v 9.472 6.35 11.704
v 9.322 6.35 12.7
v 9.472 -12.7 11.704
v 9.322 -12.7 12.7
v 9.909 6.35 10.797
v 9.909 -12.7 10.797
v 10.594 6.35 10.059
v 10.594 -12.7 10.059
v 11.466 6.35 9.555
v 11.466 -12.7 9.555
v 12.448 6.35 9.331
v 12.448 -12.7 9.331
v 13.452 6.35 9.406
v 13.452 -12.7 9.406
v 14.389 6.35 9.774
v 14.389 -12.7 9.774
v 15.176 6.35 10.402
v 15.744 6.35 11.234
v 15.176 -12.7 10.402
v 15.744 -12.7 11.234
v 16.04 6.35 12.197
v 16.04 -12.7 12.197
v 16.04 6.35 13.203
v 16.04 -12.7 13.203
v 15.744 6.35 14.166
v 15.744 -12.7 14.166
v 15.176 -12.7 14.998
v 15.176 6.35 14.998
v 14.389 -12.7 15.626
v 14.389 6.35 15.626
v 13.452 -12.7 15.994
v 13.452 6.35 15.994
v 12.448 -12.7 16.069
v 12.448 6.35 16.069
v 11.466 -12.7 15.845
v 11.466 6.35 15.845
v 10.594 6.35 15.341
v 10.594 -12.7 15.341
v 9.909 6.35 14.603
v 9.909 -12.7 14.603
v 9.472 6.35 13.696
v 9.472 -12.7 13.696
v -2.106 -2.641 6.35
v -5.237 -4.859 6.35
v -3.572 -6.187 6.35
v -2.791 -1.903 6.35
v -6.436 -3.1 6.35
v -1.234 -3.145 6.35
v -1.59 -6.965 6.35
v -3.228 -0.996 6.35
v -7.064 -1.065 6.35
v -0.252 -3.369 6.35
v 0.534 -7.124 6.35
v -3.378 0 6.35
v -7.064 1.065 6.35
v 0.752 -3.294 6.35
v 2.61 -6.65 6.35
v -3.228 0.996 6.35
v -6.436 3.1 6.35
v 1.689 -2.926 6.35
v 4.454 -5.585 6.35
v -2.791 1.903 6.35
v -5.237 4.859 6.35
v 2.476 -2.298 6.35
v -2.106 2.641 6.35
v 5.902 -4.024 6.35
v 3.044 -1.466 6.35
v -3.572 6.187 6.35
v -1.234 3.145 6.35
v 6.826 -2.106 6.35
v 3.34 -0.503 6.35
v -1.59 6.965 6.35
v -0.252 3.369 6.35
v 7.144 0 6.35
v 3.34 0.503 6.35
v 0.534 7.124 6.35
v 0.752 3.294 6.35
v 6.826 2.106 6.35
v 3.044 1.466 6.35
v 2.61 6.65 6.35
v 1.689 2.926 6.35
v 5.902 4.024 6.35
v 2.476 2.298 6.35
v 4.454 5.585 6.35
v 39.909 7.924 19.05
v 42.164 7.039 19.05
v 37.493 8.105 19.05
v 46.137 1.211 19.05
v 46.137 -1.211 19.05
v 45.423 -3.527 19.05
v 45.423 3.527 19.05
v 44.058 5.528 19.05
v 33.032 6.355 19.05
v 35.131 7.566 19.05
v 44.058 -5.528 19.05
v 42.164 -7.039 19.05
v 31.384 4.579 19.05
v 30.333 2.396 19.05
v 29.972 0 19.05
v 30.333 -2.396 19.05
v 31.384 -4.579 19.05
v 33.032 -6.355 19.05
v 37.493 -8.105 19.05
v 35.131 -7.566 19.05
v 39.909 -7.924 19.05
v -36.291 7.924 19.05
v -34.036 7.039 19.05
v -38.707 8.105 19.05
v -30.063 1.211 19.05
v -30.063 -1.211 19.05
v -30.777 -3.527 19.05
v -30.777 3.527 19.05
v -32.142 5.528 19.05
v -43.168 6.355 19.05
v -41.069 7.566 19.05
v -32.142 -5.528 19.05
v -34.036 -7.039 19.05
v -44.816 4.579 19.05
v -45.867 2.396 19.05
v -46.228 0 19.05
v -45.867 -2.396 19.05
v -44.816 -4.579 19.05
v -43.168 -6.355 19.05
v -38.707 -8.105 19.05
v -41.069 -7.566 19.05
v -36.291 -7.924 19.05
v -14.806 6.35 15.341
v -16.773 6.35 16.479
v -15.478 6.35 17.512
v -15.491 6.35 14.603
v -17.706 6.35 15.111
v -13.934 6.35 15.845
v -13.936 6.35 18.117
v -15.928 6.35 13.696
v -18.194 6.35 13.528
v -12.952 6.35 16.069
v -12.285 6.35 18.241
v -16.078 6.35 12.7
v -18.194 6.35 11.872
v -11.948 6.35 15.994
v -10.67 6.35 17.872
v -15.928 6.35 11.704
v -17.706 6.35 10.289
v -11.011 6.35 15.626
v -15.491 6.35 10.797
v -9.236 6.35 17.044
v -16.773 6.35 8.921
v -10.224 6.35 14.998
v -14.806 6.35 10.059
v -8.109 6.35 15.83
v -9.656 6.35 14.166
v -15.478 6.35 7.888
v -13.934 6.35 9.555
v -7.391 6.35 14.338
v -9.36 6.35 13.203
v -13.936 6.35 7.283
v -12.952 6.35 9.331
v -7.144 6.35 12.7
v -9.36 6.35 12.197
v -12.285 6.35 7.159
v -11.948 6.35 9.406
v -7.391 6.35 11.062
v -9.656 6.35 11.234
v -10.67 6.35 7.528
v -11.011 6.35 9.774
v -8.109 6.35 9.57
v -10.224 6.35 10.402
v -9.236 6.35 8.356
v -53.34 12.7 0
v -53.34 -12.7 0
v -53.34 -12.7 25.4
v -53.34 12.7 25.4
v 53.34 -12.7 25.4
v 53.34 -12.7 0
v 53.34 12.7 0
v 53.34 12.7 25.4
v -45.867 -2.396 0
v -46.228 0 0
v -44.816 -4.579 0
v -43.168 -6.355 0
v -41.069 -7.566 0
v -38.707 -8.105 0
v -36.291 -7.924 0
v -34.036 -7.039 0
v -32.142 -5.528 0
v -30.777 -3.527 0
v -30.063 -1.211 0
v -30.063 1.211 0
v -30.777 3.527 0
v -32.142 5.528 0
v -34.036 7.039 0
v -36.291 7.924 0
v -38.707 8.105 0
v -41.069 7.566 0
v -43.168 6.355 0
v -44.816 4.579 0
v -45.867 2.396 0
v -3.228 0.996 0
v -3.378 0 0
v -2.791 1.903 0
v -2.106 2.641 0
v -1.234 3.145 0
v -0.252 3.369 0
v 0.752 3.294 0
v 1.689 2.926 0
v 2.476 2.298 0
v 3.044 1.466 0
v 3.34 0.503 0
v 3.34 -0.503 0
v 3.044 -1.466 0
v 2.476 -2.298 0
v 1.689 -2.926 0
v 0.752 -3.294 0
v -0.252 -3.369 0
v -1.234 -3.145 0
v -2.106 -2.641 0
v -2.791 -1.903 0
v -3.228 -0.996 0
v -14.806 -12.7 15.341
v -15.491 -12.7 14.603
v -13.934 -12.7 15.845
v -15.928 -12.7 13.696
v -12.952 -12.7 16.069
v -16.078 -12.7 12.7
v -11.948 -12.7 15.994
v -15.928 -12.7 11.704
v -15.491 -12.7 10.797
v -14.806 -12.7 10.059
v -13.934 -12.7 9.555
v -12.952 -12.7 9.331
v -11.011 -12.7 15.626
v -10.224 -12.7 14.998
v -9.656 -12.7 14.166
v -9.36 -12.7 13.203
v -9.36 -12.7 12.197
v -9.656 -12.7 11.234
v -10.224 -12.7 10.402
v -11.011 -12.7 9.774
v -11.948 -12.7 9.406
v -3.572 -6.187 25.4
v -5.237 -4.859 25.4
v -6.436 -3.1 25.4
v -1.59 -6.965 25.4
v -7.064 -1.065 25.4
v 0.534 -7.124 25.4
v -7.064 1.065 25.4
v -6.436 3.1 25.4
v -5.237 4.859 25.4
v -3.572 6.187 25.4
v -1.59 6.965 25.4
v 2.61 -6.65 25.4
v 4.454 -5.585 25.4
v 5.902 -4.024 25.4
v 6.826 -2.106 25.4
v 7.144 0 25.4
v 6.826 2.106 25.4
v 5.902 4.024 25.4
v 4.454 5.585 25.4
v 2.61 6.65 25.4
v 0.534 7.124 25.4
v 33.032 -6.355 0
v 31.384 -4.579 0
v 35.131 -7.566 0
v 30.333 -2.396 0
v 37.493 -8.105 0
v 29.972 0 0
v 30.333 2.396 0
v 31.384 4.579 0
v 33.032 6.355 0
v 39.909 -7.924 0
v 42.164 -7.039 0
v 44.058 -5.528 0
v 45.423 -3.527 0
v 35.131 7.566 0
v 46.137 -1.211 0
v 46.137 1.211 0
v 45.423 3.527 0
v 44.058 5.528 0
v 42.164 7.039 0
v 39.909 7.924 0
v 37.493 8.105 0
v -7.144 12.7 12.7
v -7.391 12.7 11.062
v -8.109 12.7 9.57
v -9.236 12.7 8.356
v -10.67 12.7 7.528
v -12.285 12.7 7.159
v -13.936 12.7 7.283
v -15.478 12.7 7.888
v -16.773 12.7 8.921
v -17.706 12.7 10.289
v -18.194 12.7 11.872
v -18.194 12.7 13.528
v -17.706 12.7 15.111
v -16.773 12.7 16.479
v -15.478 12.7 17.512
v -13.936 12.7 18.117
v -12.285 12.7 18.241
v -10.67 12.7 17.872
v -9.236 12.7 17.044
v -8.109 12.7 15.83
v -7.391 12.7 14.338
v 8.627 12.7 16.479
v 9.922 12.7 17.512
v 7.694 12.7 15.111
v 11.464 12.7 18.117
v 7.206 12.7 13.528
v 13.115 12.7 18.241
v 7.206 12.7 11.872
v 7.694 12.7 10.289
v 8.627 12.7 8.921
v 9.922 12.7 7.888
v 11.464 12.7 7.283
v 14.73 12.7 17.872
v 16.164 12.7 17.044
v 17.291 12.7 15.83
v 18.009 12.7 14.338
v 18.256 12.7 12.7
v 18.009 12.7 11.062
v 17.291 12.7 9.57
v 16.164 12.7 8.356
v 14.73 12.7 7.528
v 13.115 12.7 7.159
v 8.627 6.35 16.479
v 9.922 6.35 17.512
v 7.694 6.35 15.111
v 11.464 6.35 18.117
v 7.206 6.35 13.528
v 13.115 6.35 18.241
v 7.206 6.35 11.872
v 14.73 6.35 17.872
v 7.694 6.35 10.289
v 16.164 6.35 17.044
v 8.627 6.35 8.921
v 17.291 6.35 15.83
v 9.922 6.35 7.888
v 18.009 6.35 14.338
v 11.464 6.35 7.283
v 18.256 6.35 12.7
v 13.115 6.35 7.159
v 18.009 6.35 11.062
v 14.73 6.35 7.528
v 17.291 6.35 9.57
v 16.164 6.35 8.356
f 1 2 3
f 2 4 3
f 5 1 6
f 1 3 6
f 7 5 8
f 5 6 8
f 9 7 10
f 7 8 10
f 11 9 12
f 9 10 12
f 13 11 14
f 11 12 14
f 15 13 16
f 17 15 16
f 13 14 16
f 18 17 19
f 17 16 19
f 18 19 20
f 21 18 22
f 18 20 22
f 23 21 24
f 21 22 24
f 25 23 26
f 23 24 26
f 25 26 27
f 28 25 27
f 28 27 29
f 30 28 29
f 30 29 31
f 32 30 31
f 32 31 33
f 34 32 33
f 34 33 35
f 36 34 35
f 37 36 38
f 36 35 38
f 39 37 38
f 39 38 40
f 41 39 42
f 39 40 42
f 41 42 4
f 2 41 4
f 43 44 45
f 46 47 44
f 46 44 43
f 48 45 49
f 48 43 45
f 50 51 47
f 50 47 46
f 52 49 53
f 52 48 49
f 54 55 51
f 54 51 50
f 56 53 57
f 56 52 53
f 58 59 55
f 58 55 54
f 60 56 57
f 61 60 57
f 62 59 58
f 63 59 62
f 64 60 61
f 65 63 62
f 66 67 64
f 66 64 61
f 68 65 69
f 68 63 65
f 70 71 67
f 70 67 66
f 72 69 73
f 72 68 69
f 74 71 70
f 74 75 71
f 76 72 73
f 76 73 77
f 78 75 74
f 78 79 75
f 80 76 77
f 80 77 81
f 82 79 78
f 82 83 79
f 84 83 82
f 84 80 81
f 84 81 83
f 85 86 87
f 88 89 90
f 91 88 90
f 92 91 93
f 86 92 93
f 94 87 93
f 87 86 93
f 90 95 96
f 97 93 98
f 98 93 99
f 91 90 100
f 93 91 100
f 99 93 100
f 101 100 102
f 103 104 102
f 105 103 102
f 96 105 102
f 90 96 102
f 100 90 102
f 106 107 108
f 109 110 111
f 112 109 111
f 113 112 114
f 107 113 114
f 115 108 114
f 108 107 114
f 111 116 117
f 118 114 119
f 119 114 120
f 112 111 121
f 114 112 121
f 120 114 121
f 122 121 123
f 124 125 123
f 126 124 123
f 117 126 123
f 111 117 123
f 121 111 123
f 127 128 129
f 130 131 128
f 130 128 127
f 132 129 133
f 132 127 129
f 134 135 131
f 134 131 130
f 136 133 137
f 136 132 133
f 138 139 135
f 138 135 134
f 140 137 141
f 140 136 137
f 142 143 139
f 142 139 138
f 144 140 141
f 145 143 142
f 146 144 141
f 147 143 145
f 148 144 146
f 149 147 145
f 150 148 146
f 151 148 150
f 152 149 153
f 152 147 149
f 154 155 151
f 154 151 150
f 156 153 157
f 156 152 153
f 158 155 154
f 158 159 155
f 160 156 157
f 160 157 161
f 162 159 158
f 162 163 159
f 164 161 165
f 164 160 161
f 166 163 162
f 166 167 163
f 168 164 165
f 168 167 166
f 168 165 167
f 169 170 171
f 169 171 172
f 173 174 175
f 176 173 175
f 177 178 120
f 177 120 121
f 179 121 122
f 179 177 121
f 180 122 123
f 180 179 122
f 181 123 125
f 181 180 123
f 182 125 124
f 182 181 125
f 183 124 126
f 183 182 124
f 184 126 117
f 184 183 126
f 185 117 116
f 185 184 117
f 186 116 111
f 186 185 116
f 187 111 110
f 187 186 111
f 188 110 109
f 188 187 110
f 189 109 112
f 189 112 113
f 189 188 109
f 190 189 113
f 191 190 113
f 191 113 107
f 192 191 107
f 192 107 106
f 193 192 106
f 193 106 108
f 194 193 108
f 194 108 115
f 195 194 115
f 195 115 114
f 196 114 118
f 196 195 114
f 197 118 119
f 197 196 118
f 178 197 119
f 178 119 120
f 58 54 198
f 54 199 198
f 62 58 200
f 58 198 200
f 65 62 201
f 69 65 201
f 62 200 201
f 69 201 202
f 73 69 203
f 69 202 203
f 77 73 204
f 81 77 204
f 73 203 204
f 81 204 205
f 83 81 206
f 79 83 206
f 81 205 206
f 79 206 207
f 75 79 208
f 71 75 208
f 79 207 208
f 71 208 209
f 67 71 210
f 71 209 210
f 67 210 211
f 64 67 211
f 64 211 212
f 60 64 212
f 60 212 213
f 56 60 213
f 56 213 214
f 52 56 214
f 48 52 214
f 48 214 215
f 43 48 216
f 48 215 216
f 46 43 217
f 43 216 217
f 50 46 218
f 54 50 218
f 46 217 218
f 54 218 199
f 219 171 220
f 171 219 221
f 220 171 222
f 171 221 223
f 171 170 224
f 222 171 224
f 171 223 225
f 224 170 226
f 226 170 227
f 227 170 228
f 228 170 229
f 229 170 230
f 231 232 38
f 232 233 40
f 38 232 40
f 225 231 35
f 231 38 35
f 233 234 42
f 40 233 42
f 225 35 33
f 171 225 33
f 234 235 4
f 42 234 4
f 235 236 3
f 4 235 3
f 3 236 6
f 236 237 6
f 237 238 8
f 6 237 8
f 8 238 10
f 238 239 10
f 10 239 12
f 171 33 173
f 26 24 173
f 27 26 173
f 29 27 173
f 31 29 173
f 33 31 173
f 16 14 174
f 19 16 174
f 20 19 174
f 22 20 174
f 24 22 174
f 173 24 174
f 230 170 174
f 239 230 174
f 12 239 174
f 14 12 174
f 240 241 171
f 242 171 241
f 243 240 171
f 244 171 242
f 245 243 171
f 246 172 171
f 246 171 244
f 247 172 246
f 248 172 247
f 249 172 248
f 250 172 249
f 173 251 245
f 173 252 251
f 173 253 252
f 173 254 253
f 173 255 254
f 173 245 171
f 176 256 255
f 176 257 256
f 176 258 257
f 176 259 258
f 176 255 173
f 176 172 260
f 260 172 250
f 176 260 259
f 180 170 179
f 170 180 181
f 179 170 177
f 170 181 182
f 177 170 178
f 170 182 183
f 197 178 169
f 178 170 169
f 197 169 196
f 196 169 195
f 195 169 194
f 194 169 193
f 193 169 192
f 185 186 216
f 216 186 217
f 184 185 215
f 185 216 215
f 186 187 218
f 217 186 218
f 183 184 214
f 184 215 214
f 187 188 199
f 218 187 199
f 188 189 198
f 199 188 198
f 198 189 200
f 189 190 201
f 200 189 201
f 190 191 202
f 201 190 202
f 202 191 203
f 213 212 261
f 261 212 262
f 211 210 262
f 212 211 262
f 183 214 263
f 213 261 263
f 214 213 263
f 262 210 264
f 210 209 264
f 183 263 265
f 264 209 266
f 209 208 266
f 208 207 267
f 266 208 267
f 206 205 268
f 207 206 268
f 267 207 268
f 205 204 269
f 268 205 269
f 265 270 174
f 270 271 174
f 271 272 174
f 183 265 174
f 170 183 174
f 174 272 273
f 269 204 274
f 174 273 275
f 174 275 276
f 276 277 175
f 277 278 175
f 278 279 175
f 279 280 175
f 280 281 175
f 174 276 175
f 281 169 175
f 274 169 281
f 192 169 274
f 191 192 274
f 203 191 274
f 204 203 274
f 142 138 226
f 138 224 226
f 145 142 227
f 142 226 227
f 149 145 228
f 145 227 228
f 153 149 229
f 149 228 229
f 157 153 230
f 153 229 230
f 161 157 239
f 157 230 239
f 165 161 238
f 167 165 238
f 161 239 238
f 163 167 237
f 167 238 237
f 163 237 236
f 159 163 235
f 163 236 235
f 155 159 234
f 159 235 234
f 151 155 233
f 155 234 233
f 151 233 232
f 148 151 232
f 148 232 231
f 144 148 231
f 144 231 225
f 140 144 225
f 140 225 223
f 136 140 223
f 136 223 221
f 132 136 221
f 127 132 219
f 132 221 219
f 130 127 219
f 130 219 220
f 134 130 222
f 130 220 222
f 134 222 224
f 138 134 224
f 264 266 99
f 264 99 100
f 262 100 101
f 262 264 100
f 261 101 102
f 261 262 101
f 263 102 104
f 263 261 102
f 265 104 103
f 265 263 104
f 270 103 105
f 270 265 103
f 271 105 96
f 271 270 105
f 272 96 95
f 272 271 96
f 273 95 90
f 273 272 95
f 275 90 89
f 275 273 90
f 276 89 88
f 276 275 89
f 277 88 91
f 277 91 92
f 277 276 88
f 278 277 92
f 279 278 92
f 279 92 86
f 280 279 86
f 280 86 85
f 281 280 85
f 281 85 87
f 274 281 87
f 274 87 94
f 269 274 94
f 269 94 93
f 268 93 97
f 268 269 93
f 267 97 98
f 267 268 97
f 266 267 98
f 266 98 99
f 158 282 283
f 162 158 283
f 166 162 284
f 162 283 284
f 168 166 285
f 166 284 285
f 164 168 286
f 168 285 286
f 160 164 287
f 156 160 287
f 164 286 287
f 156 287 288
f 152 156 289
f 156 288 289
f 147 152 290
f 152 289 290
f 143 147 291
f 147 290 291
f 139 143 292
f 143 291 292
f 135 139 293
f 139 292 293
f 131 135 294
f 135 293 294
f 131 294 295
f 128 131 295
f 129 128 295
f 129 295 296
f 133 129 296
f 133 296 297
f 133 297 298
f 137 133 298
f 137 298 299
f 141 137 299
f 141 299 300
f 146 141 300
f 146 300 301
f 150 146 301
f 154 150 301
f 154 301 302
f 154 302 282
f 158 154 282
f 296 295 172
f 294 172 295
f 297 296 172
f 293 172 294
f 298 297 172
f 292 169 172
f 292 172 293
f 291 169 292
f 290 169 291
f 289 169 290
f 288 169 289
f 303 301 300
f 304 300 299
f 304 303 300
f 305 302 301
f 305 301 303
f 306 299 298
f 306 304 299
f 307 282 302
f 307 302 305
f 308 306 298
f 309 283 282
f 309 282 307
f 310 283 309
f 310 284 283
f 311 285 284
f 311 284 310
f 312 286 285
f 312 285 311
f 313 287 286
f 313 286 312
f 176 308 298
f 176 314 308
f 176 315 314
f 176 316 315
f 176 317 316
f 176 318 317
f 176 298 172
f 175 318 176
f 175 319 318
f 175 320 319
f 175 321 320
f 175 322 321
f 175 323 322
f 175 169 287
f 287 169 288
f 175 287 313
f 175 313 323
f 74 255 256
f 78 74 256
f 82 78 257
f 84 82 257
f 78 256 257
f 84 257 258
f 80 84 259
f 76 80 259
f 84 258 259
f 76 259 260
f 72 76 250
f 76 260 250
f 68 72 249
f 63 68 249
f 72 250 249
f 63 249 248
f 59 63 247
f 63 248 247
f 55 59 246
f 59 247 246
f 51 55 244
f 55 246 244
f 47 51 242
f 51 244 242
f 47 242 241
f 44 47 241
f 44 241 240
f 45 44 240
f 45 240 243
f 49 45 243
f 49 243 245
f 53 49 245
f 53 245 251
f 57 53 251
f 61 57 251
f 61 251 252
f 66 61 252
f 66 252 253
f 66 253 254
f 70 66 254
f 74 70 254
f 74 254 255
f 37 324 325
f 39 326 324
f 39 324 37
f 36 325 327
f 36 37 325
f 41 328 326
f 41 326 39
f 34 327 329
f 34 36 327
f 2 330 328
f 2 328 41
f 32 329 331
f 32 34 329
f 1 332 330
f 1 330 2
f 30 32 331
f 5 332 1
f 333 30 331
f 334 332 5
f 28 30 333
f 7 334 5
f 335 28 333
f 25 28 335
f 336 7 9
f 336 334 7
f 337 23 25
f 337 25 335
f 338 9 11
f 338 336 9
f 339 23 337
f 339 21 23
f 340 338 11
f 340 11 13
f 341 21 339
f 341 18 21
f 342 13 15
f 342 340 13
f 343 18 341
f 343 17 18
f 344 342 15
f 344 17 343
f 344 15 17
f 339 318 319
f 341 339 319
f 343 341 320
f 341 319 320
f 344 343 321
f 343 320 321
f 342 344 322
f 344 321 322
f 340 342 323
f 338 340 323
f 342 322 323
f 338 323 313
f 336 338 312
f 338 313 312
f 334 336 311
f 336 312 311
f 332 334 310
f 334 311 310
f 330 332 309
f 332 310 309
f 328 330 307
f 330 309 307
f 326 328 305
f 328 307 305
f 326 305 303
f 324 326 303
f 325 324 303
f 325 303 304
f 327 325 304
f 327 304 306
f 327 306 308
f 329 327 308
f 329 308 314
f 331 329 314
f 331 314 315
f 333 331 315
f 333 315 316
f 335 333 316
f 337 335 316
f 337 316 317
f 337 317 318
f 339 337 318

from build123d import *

# Parameters (mm, degrees)
SKETCH1_W                                            = 106.68
SKETCH1_H                                            = 25.4
BOSS_EXTRUDE1_DEPTH                                  = 25.4
SKETCH1_3_R                                          = 8.128
CUT_EXTRUDE1_DEPTH                                   = 19.05
CBORE_FOR_1_4_BINDING_HEAD_MACHINE_SCREW_D           = 6.7564
CBORE_FOR_1_4_BINDING_HEAD_MACHINE_SCREW_CBORE_D     = 14.2875
CBORE_FOR_1_4_BINDING_HEAD_MACHINE_SCREW_CBORE_DEPTH = 19.05
CBORE_FOR_1_4_SOCKET_HEAD_CAP_SCREW1_D               = 6.7564
CBORE_FOR_1_4_SOCKET_HEAD_CAP_SCREW1_CBORE_D         = 11.1125
CBORE_FOR_1_4_SOCKET_HEAD_CAP_SCREW1_CBORE_DEPTH     = 6.35


with BuildPart() as part:
    # Sketch1 → Boss-Extrude1 (new body)
    with BuildSketch(Plane.XY):
        Rectangle(SKETCH1_W, SKETCH1_H)
    extrude(amount=BOSS_EXTRUDE1_DEPTH)

    # Sketch1<3> → Cut-Extrude1 (cut)
    with BuildSketch(Plane.XY):
        with Locations(Location((-38.1, 0, 0), (0, 0, 180))):
            Circle(SKETCH1_3_R)
        with Locations(Location((38.1, 0, 0), (0, 0, 180))):
            Circle(SKETCH1_3_R)
    extrude(amount=CUT_EXTRUDE1_DEPTH, mode=Mode.SUBTRACT)

    # CBORE for 1/4 Binding Head Machine Screw1 (through all)
    with Locations(Plane.XY.offset(25.4)):
        with Locations((0, 0)):
            CounterBoreHole(CBORE_FOR_1_4_BINDING_HEAD_MACHINE_SCREW_D / 2, CBORE_FOR_1_4_BINDING_HEAD_MACHINE_SCREW_CBORE_D / 2, CBORE_FOR_1_4_BINDING_HEAD_MACHINE_SCREW_CBORE_DEPTH)

    # CBORE for 1/4 Socket Head Cap Screw1 (through all)
    with Locations(Plane(origin=(0, 12.7, 0), x_dir=(1, 0, 0), z_dir=(0, 1, 0))):
        with Locations((12.7, -12.7), (-12.7, -12.7)):
            CounterBoreHole(CBORE_FOR_1_4_SOCKET_HEAD_CAP_SCREW1_D / 2, CBORE_FOR_1_4_SOCKET_HEAD_CAP_SCREW1_CBORE_D / 2, CBORE_FOR_1_4_SOCKET_HEAD_CAP_SCREW1_CBORE_DEPTH)


solid = part.part
